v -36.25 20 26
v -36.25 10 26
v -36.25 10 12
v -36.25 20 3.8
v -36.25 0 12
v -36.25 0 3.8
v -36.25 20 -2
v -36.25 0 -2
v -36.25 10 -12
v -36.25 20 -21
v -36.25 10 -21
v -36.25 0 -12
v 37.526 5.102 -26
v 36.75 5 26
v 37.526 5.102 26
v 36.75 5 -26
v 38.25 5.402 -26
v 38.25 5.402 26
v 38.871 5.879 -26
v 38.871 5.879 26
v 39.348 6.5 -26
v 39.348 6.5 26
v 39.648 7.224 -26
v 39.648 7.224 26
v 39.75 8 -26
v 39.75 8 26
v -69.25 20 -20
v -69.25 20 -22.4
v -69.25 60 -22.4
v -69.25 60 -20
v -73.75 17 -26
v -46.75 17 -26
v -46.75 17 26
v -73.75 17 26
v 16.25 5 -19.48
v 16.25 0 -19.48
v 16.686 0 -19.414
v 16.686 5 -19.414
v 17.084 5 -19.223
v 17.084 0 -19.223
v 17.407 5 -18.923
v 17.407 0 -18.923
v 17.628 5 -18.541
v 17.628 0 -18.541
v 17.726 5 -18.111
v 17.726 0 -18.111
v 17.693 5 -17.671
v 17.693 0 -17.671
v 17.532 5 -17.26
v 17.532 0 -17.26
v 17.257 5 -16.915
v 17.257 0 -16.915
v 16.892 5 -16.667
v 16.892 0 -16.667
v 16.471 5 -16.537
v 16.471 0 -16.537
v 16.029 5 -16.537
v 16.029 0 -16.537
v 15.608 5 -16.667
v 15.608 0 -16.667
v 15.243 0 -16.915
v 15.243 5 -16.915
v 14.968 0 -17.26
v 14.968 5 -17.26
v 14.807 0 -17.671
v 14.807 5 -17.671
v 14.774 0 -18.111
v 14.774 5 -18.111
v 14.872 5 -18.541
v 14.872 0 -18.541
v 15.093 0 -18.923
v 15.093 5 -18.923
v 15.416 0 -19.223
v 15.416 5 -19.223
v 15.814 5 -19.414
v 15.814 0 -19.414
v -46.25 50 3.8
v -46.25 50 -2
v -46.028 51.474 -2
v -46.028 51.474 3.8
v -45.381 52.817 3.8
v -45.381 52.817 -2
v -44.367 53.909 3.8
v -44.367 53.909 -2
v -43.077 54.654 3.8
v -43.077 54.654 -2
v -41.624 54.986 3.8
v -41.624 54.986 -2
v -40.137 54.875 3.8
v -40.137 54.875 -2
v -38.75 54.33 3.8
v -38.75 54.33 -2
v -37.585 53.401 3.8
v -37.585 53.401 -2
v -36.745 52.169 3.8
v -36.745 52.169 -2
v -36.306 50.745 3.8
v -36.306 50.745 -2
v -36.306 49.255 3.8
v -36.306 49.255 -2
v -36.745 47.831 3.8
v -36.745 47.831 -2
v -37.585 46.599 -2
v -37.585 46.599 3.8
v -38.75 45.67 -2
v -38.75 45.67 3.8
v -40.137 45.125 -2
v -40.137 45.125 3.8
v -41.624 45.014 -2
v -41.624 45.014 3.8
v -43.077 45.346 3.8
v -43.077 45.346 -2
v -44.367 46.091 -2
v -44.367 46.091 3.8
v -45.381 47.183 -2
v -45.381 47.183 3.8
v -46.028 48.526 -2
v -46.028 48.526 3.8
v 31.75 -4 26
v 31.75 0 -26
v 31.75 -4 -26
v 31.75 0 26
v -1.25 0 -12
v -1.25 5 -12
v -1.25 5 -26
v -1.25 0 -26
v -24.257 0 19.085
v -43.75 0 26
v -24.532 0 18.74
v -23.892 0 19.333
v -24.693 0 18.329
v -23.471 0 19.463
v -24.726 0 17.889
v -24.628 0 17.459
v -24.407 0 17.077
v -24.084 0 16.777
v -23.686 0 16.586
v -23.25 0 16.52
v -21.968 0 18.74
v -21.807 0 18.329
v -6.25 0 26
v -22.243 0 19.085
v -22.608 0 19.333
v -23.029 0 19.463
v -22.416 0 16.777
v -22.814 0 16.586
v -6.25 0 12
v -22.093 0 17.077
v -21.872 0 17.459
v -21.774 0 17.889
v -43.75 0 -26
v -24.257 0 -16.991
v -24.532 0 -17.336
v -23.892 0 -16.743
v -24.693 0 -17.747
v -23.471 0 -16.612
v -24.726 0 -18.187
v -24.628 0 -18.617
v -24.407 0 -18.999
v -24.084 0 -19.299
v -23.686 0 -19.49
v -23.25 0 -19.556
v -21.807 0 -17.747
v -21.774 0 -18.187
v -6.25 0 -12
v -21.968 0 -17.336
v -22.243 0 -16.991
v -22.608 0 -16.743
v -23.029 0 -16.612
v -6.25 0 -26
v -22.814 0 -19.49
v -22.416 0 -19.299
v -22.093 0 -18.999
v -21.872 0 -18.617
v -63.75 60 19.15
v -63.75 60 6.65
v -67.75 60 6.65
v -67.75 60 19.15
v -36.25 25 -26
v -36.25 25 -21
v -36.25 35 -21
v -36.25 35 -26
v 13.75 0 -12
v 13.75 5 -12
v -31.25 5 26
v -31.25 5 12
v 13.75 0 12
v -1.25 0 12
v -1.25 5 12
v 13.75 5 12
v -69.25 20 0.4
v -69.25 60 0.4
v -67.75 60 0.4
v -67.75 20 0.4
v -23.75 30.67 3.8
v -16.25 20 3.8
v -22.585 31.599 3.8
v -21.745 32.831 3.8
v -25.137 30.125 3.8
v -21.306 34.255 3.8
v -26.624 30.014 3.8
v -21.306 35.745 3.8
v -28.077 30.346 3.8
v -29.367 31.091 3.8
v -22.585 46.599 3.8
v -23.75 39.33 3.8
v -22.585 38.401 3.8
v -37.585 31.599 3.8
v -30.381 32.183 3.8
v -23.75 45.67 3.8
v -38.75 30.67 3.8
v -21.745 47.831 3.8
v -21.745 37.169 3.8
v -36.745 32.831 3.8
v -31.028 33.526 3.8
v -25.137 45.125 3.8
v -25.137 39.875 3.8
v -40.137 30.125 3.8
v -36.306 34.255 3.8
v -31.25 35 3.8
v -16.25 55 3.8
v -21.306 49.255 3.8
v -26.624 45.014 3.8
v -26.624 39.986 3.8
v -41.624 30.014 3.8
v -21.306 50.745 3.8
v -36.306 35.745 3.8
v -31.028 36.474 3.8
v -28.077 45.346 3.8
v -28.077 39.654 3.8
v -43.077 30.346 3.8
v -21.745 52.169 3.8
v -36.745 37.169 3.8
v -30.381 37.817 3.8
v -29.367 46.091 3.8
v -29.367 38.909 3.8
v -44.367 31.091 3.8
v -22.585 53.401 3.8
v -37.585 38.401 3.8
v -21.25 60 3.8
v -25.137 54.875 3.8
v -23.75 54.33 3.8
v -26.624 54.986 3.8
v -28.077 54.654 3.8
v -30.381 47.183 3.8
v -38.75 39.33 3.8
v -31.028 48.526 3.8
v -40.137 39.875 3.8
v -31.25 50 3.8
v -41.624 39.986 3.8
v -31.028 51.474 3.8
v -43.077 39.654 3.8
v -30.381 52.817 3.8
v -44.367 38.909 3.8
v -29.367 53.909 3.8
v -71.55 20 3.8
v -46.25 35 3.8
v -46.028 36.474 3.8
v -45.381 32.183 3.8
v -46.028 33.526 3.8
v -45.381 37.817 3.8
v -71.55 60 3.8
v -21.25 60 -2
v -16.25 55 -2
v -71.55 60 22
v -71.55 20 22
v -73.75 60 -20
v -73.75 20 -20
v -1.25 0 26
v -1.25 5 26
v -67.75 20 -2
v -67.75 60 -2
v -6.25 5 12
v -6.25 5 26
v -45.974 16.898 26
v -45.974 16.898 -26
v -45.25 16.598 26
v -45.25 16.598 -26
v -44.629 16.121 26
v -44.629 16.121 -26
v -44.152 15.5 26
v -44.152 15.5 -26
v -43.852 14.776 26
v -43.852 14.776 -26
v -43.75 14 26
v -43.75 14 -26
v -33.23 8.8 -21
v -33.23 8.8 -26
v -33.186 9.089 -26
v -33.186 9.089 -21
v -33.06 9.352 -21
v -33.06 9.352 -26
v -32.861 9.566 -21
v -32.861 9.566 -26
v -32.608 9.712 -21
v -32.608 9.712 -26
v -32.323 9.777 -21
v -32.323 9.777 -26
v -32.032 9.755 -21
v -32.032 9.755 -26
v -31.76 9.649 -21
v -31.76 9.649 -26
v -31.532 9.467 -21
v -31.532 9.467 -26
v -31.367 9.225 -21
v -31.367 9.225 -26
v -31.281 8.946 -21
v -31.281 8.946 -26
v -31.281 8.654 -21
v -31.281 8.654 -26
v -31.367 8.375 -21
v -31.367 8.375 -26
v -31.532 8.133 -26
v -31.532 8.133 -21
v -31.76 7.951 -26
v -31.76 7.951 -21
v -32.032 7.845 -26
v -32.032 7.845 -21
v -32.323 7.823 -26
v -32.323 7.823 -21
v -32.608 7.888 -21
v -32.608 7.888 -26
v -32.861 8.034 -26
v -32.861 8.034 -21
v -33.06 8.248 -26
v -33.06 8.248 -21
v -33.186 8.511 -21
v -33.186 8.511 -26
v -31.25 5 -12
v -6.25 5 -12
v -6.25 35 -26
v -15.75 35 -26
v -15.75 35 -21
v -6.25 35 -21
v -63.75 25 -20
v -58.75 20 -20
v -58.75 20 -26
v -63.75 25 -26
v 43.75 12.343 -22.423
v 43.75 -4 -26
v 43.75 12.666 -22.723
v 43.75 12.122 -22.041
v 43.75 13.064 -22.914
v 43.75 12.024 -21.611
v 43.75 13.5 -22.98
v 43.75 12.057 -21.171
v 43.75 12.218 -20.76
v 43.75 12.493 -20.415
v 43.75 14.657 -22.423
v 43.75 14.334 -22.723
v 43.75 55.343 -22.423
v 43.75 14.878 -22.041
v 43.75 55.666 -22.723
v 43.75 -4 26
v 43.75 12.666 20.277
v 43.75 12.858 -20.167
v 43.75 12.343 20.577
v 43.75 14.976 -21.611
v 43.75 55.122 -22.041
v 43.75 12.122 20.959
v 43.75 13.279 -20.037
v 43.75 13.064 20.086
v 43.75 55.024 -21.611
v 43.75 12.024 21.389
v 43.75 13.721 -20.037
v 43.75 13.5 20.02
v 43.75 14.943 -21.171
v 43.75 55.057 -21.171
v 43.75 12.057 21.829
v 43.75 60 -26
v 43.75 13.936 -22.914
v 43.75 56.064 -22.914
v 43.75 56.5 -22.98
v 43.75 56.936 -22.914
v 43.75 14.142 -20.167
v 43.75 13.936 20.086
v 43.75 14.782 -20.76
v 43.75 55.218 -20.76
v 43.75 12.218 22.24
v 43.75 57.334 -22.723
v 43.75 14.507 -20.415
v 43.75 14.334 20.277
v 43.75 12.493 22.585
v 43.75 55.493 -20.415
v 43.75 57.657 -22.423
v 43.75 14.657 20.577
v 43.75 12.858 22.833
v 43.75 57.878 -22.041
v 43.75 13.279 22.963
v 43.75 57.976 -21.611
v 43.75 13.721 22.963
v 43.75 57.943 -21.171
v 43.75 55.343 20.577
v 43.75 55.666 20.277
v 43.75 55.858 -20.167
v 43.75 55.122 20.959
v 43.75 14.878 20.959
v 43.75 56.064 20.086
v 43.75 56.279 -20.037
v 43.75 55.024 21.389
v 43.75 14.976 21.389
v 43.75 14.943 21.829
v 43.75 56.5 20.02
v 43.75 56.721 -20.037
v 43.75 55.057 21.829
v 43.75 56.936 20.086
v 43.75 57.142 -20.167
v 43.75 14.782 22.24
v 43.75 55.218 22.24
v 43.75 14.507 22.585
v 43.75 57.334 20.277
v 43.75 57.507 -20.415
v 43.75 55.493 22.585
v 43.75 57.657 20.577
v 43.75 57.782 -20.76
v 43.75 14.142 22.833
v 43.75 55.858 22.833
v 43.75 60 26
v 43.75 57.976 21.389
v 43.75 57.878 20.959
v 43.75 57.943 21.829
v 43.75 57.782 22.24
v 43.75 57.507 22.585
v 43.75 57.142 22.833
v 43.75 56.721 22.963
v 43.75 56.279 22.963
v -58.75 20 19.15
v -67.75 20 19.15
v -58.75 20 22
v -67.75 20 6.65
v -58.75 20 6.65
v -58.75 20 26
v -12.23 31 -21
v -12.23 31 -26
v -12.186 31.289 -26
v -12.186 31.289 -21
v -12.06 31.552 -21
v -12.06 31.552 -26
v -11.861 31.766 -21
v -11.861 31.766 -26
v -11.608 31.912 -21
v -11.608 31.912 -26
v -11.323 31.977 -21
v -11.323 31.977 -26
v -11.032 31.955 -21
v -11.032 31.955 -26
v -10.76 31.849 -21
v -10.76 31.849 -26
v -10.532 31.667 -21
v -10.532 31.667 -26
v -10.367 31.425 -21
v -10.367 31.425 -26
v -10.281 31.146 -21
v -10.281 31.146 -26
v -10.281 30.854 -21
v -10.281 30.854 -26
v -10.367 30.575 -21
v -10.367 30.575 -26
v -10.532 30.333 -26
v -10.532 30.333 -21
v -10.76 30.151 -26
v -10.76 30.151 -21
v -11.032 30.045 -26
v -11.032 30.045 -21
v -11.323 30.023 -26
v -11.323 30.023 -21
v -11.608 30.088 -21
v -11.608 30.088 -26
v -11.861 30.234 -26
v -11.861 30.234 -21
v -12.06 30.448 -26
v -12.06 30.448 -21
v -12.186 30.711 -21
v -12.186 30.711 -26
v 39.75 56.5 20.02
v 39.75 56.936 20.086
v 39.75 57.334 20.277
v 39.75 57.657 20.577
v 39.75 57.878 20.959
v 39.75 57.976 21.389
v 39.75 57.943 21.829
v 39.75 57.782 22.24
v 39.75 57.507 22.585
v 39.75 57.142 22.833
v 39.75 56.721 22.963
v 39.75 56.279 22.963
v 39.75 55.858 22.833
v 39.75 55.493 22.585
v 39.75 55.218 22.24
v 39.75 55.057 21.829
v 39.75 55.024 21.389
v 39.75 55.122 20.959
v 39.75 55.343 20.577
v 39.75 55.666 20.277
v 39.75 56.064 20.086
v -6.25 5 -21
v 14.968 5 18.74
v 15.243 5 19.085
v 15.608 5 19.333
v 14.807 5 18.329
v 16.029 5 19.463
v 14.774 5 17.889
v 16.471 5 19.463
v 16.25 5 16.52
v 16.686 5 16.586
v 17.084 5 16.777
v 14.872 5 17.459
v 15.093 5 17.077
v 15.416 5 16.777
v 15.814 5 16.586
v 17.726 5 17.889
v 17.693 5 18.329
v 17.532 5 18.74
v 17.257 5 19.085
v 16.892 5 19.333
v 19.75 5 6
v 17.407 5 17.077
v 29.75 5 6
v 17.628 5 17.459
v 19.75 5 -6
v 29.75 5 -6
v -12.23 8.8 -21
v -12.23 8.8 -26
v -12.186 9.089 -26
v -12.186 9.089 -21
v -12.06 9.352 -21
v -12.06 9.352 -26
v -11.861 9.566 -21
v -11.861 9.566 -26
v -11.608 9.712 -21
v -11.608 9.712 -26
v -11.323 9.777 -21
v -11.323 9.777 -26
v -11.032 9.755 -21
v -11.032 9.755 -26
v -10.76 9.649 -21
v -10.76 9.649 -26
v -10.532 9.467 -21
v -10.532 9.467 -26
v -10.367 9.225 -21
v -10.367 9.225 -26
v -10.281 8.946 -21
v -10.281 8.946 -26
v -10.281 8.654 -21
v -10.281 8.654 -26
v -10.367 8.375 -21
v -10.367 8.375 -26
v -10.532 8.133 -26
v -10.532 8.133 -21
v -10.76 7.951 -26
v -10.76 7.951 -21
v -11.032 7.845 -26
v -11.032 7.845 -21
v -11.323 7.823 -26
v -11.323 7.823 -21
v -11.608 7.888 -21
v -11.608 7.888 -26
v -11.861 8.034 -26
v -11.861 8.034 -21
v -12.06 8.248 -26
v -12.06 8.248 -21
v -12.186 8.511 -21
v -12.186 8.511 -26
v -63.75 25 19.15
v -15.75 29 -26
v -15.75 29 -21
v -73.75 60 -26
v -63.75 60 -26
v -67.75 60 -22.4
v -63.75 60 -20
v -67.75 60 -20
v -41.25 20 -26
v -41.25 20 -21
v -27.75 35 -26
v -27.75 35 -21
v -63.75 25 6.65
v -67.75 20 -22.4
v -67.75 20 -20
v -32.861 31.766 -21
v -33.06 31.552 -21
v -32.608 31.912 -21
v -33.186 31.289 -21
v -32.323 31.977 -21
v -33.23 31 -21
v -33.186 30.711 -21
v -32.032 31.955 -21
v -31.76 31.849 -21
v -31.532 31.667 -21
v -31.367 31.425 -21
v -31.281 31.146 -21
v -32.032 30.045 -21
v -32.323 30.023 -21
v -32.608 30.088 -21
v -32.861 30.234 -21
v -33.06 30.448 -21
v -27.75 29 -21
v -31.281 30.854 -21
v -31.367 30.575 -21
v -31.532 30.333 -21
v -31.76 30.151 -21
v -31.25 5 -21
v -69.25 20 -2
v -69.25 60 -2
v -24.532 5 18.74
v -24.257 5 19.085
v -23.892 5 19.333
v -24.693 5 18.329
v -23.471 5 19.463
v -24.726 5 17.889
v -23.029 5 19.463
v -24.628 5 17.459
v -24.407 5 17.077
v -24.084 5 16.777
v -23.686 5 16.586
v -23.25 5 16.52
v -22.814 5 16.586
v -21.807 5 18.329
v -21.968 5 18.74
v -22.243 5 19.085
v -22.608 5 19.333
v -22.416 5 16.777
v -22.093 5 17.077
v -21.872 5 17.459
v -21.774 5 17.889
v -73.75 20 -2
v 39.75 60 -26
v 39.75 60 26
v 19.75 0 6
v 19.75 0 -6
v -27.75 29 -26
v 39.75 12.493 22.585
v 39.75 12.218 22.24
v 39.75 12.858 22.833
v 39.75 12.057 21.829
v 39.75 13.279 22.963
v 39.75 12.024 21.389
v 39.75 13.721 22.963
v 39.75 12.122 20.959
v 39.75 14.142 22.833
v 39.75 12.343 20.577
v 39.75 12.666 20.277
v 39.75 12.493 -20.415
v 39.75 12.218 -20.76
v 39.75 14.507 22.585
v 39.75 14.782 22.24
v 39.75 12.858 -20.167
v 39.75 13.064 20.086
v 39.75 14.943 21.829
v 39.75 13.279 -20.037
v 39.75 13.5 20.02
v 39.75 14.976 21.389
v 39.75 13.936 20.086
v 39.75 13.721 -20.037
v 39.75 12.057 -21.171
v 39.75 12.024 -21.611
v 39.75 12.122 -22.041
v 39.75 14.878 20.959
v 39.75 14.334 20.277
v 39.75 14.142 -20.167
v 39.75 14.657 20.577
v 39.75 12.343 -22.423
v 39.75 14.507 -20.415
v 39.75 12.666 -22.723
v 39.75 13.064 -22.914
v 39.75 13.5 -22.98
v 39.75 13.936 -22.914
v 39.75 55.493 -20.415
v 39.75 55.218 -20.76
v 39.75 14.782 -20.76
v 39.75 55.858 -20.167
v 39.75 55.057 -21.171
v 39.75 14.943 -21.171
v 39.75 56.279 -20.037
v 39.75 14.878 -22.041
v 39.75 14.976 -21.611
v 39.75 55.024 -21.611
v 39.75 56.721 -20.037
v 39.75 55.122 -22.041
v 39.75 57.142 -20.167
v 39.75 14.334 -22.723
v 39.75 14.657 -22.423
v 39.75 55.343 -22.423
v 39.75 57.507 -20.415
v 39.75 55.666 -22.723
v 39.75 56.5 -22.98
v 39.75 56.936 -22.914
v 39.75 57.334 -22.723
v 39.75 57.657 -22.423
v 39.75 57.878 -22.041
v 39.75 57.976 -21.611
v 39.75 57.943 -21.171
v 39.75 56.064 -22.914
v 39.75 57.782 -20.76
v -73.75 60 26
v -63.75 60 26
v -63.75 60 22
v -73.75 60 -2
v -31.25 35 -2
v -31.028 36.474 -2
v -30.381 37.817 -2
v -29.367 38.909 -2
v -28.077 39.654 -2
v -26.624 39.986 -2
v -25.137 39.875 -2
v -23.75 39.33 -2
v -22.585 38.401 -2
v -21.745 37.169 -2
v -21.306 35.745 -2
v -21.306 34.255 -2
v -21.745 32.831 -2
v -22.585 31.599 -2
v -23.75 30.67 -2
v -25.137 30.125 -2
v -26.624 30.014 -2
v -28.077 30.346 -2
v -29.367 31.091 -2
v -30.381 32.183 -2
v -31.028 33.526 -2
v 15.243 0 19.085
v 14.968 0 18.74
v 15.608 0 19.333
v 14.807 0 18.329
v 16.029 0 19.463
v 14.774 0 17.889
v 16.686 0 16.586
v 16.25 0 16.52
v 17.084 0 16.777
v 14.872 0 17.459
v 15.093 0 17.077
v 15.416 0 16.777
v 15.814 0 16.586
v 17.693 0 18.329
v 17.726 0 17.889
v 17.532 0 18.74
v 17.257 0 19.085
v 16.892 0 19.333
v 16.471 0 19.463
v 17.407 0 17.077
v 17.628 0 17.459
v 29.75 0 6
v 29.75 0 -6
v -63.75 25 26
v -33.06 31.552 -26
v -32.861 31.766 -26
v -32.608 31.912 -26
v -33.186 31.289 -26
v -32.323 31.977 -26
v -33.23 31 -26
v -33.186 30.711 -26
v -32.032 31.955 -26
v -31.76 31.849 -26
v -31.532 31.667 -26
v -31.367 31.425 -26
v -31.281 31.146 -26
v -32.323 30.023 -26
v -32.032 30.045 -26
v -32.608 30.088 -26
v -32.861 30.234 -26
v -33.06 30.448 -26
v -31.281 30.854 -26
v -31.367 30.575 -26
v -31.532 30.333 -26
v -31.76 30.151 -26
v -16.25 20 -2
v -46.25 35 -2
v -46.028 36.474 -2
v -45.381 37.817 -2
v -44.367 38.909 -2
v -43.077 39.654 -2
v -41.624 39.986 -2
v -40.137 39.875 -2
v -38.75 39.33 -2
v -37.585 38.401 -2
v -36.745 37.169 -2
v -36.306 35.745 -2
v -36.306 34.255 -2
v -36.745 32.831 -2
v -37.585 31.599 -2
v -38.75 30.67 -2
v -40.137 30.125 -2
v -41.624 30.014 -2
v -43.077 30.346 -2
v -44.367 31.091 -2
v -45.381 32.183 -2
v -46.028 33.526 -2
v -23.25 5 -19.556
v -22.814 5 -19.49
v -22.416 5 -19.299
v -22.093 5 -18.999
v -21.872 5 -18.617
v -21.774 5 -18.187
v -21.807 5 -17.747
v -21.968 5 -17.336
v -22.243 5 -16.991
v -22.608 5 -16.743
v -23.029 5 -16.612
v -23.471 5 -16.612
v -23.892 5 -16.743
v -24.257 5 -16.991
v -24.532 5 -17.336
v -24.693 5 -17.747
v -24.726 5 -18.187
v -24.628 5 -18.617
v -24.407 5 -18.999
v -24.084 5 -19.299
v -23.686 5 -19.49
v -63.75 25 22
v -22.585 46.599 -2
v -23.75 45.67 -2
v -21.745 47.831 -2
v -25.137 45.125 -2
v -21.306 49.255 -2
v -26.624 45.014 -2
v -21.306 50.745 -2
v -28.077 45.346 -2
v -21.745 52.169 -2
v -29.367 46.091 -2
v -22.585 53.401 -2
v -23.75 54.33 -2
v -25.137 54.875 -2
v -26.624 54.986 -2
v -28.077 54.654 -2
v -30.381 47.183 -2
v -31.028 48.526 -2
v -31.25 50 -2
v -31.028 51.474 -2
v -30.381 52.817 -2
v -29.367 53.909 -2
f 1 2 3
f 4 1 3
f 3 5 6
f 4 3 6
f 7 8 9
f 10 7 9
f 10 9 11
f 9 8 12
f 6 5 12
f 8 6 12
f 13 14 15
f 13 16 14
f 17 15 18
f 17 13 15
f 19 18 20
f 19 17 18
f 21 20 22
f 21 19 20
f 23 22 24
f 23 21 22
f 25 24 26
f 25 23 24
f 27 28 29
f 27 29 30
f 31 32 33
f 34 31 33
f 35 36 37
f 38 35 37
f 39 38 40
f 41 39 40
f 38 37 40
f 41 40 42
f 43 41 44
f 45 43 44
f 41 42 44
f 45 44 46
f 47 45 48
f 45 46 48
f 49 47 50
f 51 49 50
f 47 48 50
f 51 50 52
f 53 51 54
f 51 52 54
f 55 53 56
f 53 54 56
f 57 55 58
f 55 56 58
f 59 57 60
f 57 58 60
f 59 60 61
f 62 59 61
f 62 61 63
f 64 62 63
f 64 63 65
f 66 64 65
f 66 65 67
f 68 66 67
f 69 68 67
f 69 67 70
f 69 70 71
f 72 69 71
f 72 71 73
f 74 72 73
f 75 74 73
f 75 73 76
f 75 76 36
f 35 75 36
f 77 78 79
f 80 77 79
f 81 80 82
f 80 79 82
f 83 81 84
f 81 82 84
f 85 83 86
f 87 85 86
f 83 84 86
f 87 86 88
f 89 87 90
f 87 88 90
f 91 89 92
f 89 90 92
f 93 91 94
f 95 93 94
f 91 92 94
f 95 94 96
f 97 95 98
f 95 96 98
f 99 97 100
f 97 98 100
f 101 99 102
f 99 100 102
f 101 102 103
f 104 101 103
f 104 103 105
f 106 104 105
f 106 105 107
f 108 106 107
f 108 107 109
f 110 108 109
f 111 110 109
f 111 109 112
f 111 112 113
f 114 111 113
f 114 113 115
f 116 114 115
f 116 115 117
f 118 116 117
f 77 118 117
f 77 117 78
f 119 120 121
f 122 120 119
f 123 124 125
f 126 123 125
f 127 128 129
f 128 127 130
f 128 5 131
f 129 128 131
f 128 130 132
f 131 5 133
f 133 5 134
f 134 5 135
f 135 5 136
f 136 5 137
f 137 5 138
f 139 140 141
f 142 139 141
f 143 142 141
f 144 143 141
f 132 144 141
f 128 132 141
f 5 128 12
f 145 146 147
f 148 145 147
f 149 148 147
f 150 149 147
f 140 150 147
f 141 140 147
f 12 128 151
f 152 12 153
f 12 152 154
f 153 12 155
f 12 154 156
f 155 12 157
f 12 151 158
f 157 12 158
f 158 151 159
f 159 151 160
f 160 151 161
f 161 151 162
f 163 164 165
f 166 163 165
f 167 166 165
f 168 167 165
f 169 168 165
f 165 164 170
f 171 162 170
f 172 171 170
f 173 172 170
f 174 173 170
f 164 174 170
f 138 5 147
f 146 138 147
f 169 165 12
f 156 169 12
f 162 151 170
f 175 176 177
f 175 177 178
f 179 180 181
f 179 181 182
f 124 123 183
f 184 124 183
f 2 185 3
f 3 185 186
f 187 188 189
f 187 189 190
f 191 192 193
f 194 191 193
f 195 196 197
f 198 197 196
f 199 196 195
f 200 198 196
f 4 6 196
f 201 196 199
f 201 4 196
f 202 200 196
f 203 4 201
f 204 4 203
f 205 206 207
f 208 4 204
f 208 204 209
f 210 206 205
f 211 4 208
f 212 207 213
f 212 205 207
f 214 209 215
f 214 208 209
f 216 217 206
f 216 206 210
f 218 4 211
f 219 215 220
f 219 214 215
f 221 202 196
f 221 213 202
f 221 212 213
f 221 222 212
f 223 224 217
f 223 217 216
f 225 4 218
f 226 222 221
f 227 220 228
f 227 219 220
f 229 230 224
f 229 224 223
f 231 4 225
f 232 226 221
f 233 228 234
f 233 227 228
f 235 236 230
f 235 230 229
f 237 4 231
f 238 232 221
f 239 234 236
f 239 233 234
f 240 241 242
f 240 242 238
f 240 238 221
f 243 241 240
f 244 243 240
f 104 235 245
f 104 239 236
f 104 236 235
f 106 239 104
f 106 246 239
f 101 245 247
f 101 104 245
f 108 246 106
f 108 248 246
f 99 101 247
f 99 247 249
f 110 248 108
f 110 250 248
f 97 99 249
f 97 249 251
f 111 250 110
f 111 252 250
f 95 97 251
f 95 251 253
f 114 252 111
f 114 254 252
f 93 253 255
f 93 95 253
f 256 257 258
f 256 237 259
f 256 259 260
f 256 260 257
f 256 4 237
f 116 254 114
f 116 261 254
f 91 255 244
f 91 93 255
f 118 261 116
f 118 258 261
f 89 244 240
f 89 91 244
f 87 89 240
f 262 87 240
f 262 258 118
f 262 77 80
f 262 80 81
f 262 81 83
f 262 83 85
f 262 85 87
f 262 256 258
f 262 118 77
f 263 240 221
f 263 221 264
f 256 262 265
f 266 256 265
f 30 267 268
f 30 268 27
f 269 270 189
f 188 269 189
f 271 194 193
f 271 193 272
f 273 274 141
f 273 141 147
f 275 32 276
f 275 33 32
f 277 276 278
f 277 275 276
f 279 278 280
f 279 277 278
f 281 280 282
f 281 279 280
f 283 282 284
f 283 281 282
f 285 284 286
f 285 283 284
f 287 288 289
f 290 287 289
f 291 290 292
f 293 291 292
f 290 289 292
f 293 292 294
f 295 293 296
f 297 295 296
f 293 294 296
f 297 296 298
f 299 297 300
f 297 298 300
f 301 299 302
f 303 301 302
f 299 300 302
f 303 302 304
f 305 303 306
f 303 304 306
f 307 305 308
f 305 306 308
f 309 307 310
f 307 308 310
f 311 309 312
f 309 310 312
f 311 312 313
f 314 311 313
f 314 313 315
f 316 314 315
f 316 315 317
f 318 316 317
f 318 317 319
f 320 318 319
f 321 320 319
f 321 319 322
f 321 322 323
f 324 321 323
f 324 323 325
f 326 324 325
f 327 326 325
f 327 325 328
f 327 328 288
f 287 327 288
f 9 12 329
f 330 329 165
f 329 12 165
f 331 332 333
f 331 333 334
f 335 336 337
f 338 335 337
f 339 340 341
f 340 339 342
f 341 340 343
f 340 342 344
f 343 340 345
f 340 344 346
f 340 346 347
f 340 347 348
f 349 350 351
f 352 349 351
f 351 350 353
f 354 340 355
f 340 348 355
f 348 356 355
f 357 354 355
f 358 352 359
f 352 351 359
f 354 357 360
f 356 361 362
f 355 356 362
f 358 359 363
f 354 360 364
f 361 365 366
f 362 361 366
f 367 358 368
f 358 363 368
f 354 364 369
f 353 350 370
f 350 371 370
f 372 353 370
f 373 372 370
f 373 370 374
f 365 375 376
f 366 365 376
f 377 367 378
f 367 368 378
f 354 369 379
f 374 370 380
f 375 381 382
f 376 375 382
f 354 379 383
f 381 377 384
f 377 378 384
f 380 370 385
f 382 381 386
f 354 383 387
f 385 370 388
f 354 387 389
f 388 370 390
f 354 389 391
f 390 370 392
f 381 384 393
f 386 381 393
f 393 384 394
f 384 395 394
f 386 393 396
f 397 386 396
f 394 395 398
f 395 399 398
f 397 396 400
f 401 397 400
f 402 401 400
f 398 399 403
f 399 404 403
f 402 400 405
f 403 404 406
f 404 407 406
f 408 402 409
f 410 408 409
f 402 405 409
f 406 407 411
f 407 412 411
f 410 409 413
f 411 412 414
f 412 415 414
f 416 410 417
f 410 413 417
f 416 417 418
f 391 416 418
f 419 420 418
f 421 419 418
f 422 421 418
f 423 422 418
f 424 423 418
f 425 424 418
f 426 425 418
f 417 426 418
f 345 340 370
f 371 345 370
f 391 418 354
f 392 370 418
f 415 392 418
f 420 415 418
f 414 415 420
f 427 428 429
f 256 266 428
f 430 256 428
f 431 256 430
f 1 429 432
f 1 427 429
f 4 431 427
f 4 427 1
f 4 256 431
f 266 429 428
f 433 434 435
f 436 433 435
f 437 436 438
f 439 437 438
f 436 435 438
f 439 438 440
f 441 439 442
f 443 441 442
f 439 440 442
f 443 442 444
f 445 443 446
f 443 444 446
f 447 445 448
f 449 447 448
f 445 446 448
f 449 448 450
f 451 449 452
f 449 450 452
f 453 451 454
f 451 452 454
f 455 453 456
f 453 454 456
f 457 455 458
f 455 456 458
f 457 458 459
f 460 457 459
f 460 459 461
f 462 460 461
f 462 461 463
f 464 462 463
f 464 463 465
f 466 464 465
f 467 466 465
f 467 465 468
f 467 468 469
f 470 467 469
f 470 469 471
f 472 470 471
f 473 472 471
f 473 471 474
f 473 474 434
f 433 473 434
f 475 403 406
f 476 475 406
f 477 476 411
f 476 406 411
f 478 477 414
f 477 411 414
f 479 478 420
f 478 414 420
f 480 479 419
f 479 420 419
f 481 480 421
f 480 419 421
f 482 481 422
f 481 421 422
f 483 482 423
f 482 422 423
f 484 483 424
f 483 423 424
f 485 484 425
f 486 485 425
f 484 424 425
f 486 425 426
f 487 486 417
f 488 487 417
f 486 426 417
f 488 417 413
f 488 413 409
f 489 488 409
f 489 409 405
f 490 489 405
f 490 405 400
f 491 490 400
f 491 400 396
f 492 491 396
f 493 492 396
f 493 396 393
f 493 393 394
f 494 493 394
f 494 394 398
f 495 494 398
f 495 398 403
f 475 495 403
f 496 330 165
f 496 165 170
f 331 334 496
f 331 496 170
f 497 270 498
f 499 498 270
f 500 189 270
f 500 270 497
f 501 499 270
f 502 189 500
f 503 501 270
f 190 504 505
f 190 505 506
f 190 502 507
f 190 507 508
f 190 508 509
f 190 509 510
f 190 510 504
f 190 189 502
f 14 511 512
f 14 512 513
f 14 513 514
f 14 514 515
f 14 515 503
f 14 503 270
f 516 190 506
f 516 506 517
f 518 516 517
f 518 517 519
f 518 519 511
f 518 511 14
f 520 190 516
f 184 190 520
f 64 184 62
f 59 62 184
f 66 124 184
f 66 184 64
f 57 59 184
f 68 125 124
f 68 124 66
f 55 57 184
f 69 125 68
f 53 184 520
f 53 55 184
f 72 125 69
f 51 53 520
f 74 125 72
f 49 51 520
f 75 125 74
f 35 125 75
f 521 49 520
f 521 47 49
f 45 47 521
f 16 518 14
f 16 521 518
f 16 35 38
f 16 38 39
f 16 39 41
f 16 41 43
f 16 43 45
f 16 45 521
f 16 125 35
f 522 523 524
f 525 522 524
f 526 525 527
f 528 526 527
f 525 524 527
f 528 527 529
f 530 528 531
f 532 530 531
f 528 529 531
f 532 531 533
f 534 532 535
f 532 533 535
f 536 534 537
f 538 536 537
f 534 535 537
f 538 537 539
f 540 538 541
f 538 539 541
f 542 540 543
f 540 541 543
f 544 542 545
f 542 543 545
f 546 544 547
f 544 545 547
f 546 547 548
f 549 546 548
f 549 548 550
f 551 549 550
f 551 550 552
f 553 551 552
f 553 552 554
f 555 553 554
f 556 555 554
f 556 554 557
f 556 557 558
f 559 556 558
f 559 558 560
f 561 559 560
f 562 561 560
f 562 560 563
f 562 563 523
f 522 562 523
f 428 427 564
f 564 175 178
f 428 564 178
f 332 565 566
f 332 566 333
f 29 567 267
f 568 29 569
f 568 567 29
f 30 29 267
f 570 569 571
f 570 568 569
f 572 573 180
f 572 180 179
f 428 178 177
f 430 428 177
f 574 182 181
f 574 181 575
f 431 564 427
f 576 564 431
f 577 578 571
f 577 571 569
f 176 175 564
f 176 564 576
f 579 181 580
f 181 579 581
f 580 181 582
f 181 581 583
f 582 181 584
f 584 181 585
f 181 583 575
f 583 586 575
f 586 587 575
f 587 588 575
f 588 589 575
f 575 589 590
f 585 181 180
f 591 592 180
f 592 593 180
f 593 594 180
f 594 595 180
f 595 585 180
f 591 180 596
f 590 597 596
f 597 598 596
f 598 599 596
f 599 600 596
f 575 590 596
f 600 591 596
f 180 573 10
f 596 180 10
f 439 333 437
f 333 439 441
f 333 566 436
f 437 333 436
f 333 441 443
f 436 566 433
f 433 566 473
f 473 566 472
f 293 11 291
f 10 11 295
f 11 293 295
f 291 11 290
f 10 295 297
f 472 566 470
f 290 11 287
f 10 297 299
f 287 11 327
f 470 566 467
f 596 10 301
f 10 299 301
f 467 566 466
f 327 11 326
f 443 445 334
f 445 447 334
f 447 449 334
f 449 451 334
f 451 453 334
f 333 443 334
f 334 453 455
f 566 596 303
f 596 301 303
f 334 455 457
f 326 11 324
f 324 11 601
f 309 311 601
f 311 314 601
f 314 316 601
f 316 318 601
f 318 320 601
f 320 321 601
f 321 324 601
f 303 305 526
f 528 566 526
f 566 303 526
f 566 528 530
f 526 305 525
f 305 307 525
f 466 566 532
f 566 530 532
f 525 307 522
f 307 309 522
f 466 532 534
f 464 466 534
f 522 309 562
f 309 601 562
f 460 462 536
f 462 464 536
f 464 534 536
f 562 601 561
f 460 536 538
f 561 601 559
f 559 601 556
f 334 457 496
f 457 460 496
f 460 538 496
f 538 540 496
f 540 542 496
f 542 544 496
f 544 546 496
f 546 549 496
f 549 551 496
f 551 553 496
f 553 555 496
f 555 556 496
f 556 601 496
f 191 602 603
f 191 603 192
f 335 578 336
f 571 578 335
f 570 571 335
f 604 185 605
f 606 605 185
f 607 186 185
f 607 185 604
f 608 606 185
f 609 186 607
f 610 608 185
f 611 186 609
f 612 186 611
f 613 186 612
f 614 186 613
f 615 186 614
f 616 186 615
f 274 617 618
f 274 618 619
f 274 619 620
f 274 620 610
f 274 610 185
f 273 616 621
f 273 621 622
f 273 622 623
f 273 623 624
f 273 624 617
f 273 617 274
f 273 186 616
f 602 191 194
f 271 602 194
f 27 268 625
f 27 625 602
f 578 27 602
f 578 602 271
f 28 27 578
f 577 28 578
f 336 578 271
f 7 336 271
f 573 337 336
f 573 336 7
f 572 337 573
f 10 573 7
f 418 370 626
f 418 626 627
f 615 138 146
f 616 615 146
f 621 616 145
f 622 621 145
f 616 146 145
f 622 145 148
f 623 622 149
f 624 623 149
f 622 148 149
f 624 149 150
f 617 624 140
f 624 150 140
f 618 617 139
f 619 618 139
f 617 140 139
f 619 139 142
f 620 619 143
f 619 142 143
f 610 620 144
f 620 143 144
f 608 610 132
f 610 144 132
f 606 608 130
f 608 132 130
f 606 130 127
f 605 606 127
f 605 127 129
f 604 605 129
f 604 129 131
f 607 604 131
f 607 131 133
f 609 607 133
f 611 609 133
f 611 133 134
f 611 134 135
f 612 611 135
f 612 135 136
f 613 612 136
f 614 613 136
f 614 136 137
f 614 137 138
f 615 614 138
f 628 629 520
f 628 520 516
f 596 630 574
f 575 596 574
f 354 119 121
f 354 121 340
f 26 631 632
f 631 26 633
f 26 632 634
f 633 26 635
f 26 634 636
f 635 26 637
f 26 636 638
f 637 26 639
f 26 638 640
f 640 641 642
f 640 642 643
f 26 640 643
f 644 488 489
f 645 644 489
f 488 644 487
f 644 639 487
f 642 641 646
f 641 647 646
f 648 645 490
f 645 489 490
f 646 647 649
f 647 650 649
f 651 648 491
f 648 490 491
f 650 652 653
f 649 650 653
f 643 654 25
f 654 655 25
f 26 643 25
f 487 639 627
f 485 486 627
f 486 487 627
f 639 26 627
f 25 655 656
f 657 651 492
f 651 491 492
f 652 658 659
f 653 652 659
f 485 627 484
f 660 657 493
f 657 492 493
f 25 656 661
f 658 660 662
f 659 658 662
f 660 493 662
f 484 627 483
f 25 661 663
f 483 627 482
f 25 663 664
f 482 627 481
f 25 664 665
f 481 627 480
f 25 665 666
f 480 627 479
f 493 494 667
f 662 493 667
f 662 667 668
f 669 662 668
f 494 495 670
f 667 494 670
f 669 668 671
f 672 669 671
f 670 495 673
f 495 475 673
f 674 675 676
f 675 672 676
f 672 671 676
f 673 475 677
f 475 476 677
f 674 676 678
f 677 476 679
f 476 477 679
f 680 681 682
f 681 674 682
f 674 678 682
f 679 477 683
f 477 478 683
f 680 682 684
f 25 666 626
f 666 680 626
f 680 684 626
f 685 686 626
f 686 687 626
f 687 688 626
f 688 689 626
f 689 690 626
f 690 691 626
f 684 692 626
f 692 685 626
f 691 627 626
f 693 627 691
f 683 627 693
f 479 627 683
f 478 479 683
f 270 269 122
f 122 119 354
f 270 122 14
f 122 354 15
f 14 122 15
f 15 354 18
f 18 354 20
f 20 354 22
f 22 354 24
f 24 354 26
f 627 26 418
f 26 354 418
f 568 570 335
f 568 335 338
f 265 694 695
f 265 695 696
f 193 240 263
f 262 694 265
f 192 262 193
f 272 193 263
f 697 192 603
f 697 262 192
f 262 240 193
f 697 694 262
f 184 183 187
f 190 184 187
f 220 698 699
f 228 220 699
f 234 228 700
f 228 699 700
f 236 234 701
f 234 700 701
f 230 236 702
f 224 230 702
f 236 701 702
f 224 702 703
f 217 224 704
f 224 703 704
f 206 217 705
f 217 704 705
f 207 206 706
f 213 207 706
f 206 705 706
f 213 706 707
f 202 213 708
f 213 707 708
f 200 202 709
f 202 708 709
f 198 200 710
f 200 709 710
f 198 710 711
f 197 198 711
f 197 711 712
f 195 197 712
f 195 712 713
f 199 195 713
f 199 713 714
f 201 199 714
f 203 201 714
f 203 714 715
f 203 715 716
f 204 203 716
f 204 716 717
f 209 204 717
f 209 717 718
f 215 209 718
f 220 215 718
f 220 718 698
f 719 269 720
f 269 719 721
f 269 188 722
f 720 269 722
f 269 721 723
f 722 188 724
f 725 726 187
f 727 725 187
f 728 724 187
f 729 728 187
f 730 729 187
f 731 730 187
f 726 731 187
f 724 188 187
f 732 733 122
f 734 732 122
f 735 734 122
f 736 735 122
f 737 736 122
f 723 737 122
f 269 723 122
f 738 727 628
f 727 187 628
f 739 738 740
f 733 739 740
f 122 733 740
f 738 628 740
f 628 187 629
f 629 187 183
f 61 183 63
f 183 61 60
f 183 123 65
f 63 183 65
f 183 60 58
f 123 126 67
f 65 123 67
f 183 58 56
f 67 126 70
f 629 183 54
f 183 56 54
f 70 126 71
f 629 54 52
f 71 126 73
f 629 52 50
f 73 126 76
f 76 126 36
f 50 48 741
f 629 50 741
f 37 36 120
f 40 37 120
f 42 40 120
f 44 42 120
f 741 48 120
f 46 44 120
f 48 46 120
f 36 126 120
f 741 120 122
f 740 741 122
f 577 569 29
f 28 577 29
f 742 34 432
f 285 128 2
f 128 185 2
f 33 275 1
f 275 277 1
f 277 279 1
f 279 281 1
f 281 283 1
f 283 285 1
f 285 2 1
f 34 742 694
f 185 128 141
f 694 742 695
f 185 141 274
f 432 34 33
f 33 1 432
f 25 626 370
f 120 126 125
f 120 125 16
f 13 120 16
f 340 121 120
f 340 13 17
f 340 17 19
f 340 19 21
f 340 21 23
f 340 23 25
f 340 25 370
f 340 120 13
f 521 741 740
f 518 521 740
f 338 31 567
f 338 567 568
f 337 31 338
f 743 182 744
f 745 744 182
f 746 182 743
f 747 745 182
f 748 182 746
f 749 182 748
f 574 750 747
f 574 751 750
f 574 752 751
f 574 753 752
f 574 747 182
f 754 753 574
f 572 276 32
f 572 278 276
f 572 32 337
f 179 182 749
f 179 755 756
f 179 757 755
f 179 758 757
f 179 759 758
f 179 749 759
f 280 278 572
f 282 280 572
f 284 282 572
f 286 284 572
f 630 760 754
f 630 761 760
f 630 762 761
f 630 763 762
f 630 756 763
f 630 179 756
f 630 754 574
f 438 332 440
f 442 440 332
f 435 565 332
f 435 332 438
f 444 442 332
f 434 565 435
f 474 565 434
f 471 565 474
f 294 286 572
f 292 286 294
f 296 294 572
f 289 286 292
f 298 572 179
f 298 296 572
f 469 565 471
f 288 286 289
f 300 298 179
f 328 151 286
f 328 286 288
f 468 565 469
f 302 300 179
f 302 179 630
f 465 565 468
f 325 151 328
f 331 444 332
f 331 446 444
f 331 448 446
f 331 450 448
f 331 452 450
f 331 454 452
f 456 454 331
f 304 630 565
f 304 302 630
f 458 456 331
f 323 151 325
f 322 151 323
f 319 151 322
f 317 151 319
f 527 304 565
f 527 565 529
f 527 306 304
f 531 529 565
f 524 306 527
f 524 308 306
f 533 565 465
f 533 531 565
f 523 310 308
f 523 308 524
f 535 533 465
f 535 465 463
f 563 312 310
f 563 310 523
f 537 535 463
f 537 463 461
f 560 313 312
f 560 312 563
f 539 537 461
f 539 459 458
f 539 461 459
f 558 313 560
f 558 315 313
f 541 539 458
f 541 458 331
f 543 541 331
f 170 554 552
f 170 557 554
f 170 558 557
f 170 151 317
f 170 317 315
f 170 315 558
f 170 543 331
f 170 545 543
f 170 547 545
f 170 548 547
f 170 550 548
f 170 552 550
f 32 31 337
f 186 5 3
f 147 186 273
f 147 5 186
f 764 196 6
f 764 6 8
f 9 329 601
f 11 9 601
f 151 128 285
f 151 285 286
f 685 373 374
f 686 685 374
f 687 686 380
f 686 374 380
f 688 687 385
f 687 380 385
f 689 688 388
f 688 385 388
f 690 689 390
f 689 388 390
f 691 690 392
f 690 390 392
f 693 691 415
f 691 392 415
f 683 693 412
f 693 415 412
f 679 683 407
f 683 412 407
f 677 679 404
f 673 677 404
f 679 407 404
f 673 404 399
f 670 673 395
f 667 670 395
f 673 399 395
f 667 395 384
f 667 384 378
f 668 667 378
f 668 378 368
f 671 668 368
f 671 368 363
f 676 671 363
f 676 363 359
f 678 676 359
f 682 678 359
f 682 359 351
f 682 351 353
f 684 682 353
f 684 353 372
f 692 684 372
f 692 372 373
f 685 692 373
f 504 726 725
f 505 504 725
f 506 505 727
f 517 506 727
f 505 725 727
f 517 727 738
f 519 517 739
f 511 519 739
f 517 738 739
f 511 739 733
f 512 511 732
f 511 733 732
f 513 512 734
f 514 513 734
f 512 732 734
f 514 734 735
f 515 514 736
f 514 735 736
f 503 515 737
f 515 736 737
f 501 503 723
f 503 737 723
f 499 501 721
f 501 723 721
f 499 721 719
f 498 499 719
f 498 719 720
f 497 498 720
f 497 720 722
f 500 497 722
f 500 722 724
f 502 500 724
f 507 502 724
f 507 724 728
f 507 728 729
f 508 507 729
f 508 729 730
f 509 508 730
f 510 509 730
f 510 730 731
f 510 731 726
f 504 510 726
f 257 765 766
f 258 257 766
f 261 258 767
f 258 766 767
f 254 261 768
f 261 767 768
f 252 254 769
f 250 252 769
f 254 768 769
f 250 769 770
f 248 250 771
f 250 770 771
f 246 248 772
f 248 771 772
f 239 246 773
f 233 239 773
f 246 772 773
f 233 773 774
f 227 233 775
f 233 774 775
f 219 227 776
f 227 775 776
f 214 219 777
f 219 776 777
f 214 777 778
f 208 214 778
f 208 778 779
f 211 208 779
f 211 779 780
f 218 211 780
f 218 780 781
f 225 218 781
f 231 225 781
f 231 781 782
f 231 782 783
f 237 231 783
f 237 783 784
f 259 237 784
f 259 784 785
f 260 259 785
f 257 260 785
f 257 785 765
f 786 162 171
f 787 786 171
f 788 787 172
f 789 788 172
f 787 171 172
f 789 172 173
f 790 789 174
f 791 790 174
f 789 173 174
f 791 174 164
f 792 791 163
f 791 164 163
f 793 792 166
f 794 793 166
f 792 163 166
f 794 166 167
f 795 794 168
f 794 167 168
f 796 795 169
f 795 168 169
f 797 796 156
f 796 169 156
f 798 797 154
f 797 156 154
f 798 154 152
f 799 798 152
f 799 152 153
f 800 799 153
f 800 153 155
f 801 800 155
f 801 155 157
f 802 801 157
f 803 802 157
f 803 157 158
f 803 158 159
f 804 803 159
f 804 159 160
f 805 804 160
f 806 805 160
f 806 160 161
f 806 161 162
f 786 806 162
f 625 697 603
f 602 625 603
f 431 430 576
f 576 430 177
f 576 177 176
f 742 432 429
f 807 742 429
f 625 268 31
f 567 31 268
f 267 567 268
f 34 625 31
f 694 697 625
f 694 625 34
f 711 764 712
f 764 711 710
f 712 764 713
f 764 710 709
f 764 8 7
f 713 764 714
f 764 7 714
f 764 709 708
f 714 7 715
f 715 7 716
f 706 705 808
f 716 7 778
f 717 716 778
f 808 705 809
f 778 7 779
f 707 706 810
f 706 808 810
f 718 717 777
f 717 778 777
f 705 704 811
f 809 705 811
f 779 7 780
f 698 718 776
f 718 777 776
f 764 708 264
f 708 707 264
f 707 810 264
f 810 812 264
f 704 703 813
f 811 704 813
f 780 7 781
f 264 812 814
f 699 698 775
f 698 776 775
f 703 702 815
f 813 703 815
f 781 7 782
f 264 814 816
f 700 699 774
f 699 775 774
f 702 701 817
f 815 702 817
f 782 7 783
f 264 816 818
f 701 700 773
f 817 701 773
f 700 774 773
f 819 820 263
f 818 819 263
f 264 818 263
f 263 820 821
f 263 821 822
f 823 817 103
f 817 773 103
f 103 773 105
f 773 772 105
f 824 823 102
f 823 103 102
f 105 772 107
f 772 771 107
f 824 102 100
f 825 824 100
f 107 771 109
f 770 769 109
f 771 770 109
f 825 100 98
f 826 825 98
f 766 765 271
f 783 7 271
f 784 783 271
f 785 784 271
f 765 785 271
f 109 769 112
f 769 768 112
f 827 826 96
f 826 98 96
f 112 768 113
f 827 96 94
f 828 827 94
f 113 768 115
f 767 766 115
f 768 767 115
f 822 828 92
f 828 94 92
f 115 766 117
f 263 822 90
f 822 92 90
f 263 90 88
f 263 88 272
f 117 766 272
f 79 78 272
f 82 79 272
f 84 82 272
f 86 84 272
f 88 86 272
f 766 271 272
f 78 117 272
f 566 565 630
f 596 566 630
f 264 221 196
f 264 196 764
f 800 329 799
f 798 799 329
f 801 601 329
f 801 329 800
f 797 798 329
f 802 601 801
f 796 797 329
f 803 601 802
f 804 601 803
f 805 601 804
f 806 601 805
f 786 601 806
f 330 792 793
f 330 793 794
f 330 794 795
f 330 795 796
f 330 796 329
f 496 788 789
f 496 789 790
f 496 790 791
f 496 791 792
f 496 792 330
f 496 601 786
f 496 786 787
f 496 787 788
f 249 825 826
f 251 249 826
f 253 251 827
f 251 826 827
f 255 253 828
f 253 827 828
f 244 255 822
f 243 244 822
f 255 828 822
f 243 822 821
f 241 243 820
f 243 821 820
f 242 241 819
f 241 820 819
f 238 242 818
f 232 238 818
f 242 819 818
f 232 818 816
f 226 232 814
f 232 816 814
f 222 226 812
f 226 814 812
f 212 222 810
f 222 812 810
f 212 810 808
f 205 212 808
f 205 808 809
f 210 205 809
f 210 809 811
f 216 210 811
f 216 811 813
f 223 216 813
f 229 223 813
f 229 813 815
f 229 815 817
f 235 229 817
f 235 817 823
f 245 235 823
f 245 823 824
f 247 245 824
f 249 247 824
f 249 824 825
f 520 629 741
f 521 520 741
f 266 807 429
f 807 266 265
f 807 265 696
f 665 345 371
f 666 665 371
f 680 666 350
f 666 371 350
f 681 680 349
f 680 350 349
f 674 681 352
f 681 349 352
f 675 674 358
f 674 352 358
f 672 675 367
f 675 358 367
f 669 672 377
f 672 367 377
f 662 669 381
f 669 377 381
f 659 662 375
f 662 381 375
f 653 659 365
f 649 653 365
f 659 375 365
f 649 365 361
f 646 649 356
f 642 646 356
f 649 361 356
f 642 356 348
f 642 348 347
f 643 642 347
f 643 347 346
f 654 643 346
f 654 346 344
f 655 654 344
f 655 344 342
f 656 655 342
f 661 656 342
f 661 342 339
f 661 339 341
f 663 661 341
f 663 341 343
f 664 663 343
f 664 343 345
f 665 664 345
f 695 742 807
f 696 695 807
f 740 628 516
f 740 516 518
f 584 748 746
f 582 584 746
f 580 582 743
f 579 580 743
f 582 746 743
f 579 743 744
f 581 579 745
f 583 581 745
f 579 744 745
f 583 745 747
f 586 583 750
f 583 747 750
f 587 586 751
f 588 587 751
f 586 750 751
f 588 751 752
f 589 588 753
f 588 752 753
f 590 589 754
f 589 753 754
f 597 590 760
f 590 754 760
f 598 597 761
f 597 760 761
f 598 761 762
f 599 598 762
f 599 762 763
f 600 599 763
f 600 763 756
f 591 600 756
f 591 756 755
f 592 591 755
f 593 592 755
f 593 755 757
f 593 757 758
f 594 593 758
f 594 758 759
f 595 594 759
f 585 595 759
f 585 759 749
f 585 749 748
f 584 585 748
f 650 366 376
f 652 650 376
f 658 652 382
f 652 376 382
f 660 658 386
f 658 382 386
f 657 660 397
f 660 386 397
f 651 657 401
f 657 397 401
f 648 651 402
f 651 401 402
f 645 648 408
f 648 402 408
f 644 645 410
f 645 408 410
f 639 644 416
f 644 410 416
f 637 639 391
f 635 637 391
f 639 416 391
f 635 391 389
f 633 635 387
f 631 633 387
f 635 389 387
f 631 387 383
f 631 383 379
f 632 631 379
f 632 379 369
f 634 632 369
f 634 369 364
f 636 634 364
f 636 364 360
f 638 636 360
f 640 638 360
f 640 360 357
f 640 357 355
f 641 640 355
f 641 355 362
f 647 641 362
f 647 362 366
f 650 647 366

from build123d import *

# Parameters (mm, degrees)
SKETCH_1_W           = 87.5
SKETCH_1_H           = 62
EXTRUDE_1_DEPTH      = 60
SKETCH_2_W           = 12
SKETCH_2_H           = 62
EXTRUDE_2_DEPTH      = 4
SKETCH_4_R           = 1.48
SKETCH_4_W           = 10
SKETCH_4_H           = 12
SKETCH_4_W_2         = 50
SKETCH_4_H_2         = 24
CUT_EXTRUDE_2_DEPTH  = 10
SKETCH_6_W           = 87.5
SKETCH_6_H           = 5
CUT_EXTRUDE_3_DEPTH  = 100
SKETCH_7_W           = 52
SKETCH_7_H           = 43
EXTRUDE_3_DEPTH      = 30
SKETCH_9_W           = 103.5
SKETCH_9_H           = 52
CUT_EXTRUDE_4_DEPTH  = 40
SKETCH_10_W          = 76
SKETCH_10_H          = 52
CUT_EXTRUDE_5_DEPTH  = 15
SKETCH_11_R          = 1.48
CUT_EXTRUDE_6_DEPTH  = 10
CUT_EXTRUDE_7_DEPTH  = 40
SKETCH_12_4_W        = 4
SKETCH_12_4_H        = 18
SKETCH_12_4_W_2      = 4.5
CUT_EXTRUDE_8_DEPTH  = 40
SKETCH_13_W          = 27.5
SKETCH_13_H          = 5.8
EXTRUDE_4_DEPTH      = 40
SKETCH_14_W          = 30
SKETCH_14_H          = 5
EXTRUDE_5_DEPTH      = 30
SKETCH_15_R          = 0.98
SKETCH_15_W          = 12
SKETCH_15_H          = 6
CUT_EXTRUDE_9_DEPTH  = 10
FILLET_2_R           = 3
SKETCH_16_W          = 5
SKETCH_16_H          = 14
CUT_EXTRUDE_10_DEPTH = 10
CHAMFER_4_SIZE       = 5
SKETCH_17_W          = 5.8
SKETCH_17_H          = 40
EXTRUDE_6_DEPTH      = 20
CHAMFER_5_SIZE       = 20
CHAMFER_6_SIZE       = 5
SKETCH_18_R          = 5
CUT_EXTRUDE_11_DEPTH = 20
FILLET_3_R           = 3


with BuildPart() as part:
    # 草图1 → 凸台-拉伸1 (new body)
    with BuildSketch(Plane(origin=(0, 0, 0), x_dir=(1, 0, 0), z_dir=(0, 1, 0))):
        Rectangle(SKETCH_1_W, SKETCH_1_H)
    extrude(amount=EXTRUDE_1_DEPTH)

    # 草图2 → 凸台-拉伸2 (add)
    with BuildSketch(Plane.XZ):
        with Locations((37.75, 0)):
            Rectangle(SKETCH_2_W, SKETCH_2_H)
    extrude(amount=EXTRUDE_2_DEPTH)

    # 草图4 → 切除-拉伸2 (cut)
    with BuildSketch(Plane.XZ):
        with Locations(Location((16.25, -18, 0), (0, 0, 270))):
            Circle(SKETCH_4_R)
        with Locations(Location((-23.25, -18.075939793, 0), (0, 0, 270))):
            Circle(SKETCH_4_R)
        with Locations(Location((-23.25, 18, 0), (0, 0, 270))):
            Circle(SKETCH_4_R)
        with Locations(Location((16.25, 18, 0), (0, 0, 270))):
            Circle(SKETCH_4_R)
        with Locations((24.75, 0)):
            Rectangle(SKETCH_4_W, SKETCH_4_H)
        with Locations((-11.25, 0)):
            Rectangle(SKETCH_4_W_2, SKETCH_4_H_2)
    extrude(amount=-CUT_EXTRUDE_2_DEPTH, mode=Mode.SUBTRACT)

    # 草图6 → 切除-拉伸3 (cut)
    with BuildSketch(Plane(origin=(0, 60, 0), x_dir=(1, 0, 0), z_dir=(0, 1, 0))):
        with Locations((0, -28.5)):
            Rectangle(SKETCH_6_W, SKETCH_6_H)
        with Locations((0, 28.5)):
            Rectangle(SKETCH_6_W, SKETCH_6_H)
    extrude(amount=-CUT_EXTRUDE_3_DEPTH, mode=Mode.SUBTRACT)

    # 草图7 → 凸台-拉伸3 (add)
    with BuildSketch(Plane.ZY.offset(43.75)):
        with Locations((0, 38.5)):
            Rectangle(SKETCH_7_W, SKETCH_7_H)
    extrude(amount=EXTRUDE_3_DEPTH)

    # 草图9 → 切除-拉伸4 (cut)
    with BuildSketch(Plane(origin=(0, 60, 0), x_dir=(1, 0, 0), z_dir=(0, 1, 0))):
        with Locations((-12, 0)):
            Rectangle(SKETCH_9_W, SKETCH_9_H)
    extrude(amount=-CUT_EXTRUDE_4_DEPTH, mode=Mode.SUBTRACT)

    # 草图10 → 切除-拉伸5 (cut)
    with BuildSketch(Plane(origin=(0, 20, 0), x_dir=(1, 0, 0), z_dir=(0, 1, 0))):
        with Locations((1.75, 0)):
            Rectangle(SKETCH_10_W, SKETCH_10_H)
    extrude(amount=-CUT_EXTRUDE_5_DEPTH, mode=Mode.SUBTRACT)

    # 草图11 → 切除-拉伸6 (cut)
    with BuildSketch(Plane(origin=(43.75, 0, 0), x_dir=(0, 0, -1), z_dir=(1, 0, 0))):
        with Locations((-21.5, 56.5)):
            Circle(SKETCH_11_R)
        with Locations((21.5, 56.5)):
            Circle(SKETCH_11_R)
        with Locations((-21.5, 13.5)):
            Circle(SKETCH_11_R)
        with Locations((21.5, 13.5)):
            Circle(SKETCH_11_R)
    extrude(amount=-CUT_EXTRUDE_6_DEPTH, mode=Mode.SUBTRACT)

    # 草图12 → 切除-拉伸7 (cut)
    with BuildSketch(Plane(origin=(0, 60, 0), x_dir=(1, 0, 0), z_dir=(0, 1, 0))):
        Polygon((-63.75, -22), (-63.75, -19.15), (-67.75, -19.15), (-67.75, -6.65), (-63.75, -6.65), (-63.75, -3.8), (-71.55, -3.8), (-71.55, -22), align=None)
    extrude(amount=-CUT_EXTRUDE_7_DEPTH, mode=Mode.SUBTRACT)

    # 草图12<4> → 切除-拉伸8 (cut)
    with BuildSketch(Plane(origin=(0, 60, 0), x_dir=(1, 0, 0), z_dir=(0, 1, 0))):
        Polygon((-67.75, -0.4), (-67.75, 2), (-67.75, 20), (-67.75, 22.4), (-69.25, 22.4), (-69.25, 20), (-69.25, 2), (-69.25, -0.4), align=None)
        with Locations((-65.75, 11)):
            Rectangle(SKETCH_12_4_W, SKETCH_12_4_H)
        with Locations((-71.5, 11)):
            Rectangle(SKETCH_12_4_W_2, SKETCH_12_4_H)
    extrude(amount=-CUT_EXTRUDE_8_DEPTH, mode=Mode.SUBTRACT)

    # 草图13 → 凸台-拉伸4 (add)
    with BuildSketch(Plane(origin=(0, 20, 0), x_dir=(1, 0, 0), z_dir=(0, 1, 0))):
        with Locations((-50, -0.9)):
            Rectangle(SKETCH_13_W, SKETCH_13_H)
    extrude(amount=EXTRUDE_4_DEPTH)

    # 草图14 → 凸台-拉伸5 (add)
    with BuildSketch(Plane(origin=(0, 5, 0), x_dir=(1, 0, 0), z_dir=(0, 1, 0))):
        with Locations((-21.25, 23.5)):
            Rectangle(SKETCH_14_W, SKETCH_14_H)
    extrude(amount=EXTRUDE_5_DEPTH)

    # 草图15 → 切除-拉伸9 (cut)
    with BuildSketch(Plane(origin=(0, 0, -26), x_dir=(-1, 0, 0), z_dir=(0, 0, -1))):
        with Locations((11.25, 31)):
            Circle(SKETCH_15_R)
        with Locations((32.25, 31)):
            Circle(SKETCH_15_R)
        with Locations((11.25, 8.8)):
            Circle(SKETCH_15_R)
        with Locations((32.25, 8.8)):
            Circle(SKETCH_15_R)
        with Locations((21.75, 32)):
            Rectangle(SKETCH_15_W, SKETCH_15_H)
    extrude(amount=-CUT_EXTRUDE_9_DEPTH, mode=Mode.SUBTRACT)

    # 圆角2
    fillet_2_edges = [part.edges().sort_by_distance(p)[0] for p in [
        (-43.75, 17, 0),
    ]]
    fillet(fillet_2_edges, radius=FILLET_2_R)

    # 草图16 → 切除-拉伸10 (cut)
    with BuildSketch(Plane(origin=(0, 5, 0), x_dir=(1, 0, 0), z_dir=(0, 1, 0))):
        with Locations((-3.75, -19)):
            Rectangle(SKETCH_16_W, SKETCH_16_H)
        with Locations((-3.75, 19)):
            Rectangle(SKETCH_16_W, SKETCH_16_H)
    extrude(amount=-CUT_EXTRUDE_10_DEPTH, mode=Mode.SUBTRACT)


with BuildPart() as cut_extrude_10_piece_1:
    # of the separate pieces the step leaves, piece 1, a body of its own (cut_extrude_10_pieces)
    add(part.part.solids().sort_by_distance((-43.75, 14, -26))[0])

    # 倒角4
    chamfer_4_edges = [cut_extrude_10_piece_1.edges().sort_by_distance(p)[0] for p in [
        (-36.25, 20, -23.5),
        (-36.25, 5, 19),
        (-36.25, 5, -16.5),
        (-63.75, 20, 12.9),
        (-63.75, 20, 24),
        (-63.75, 20, -23),
    ]]
    chamfer(chamfer_4_edges, length=CHAMFER_4_SIZE)

    # 草图17 → 凸台-拉伸6 (add)
    with BuildSketch(Plane(origin=(-36.25, 0, 0), x_dir=(0, 0, -1), z_dir=(1, 0, 0))):
        with Locations((-0.9, 40)):
            Rectangle(SKETCH_17_W, SKETCH_17_H)
    extrude(amount=EXTRUDE_6_DEPTH)

    # 倒角5
    chamfer_5_edges = [cut_extrude_10_piece_1.edges().sort_by_distance(p)[0] for p in [
        (-36.25, 20, 0.9),
    ]]
    chamfer(chamfer_5_edges, length=CHAMFER_5_SIZE - 0.0001)  # a hair under: the kernel refuses the full size

    # 倒角6
    chamfer_6_edges = [cut_extrude_10_piece_1.edges().sort_by_distance(p)[0] for p in [
        (-16.25, 60, 0.9),
    ]]
    chamfer(chamfer_6_edges, length=CHAMFER_6_SIZE)

    # 草图18 → 切除-拉伸11 (cut)
    with BuildSketch(Plane(origin=(0, 0, -2), x_dir=(-1, 0, 0), z_dir=(0, 0, -1))):
        with Locations((26.25, 50)):
            Circle(SKETCH_18_R)
        with Locations((41.25, 50)):
            Circle(SKETCH_18_R)
        with Locations((26.25, 35)):
            Circle(SKETCH_18_R)
        with Locations((41.25, 35)):
            Circle(SKETCH_18_R)
    extrude(amount=-CUT_EXTRUDE_11_DEPTH, mode=Mode.SUBTRACT)


with BuildPart() as cut_extrude_10_piece_2:
    # of the separate pieces the step leaves, piece 2, a body of its own (cut_extrude_10_pieces)
    add(part.part.solids().sort_by_distance((-1.25, 0, -26))[0])

    # 圆角3
    fillet_3_edges = [cut_extrude_10_piece_2.edges().sort_by_distance(p)[0] for p in [
        (39.75, 5, 0),
    ]]
    fillet(fillet_3_edges, radius=FILLET_3_R)


solid = Compound([cut_extrude_10_piece_1.part, cut_extrude_10_piece_2.part])
